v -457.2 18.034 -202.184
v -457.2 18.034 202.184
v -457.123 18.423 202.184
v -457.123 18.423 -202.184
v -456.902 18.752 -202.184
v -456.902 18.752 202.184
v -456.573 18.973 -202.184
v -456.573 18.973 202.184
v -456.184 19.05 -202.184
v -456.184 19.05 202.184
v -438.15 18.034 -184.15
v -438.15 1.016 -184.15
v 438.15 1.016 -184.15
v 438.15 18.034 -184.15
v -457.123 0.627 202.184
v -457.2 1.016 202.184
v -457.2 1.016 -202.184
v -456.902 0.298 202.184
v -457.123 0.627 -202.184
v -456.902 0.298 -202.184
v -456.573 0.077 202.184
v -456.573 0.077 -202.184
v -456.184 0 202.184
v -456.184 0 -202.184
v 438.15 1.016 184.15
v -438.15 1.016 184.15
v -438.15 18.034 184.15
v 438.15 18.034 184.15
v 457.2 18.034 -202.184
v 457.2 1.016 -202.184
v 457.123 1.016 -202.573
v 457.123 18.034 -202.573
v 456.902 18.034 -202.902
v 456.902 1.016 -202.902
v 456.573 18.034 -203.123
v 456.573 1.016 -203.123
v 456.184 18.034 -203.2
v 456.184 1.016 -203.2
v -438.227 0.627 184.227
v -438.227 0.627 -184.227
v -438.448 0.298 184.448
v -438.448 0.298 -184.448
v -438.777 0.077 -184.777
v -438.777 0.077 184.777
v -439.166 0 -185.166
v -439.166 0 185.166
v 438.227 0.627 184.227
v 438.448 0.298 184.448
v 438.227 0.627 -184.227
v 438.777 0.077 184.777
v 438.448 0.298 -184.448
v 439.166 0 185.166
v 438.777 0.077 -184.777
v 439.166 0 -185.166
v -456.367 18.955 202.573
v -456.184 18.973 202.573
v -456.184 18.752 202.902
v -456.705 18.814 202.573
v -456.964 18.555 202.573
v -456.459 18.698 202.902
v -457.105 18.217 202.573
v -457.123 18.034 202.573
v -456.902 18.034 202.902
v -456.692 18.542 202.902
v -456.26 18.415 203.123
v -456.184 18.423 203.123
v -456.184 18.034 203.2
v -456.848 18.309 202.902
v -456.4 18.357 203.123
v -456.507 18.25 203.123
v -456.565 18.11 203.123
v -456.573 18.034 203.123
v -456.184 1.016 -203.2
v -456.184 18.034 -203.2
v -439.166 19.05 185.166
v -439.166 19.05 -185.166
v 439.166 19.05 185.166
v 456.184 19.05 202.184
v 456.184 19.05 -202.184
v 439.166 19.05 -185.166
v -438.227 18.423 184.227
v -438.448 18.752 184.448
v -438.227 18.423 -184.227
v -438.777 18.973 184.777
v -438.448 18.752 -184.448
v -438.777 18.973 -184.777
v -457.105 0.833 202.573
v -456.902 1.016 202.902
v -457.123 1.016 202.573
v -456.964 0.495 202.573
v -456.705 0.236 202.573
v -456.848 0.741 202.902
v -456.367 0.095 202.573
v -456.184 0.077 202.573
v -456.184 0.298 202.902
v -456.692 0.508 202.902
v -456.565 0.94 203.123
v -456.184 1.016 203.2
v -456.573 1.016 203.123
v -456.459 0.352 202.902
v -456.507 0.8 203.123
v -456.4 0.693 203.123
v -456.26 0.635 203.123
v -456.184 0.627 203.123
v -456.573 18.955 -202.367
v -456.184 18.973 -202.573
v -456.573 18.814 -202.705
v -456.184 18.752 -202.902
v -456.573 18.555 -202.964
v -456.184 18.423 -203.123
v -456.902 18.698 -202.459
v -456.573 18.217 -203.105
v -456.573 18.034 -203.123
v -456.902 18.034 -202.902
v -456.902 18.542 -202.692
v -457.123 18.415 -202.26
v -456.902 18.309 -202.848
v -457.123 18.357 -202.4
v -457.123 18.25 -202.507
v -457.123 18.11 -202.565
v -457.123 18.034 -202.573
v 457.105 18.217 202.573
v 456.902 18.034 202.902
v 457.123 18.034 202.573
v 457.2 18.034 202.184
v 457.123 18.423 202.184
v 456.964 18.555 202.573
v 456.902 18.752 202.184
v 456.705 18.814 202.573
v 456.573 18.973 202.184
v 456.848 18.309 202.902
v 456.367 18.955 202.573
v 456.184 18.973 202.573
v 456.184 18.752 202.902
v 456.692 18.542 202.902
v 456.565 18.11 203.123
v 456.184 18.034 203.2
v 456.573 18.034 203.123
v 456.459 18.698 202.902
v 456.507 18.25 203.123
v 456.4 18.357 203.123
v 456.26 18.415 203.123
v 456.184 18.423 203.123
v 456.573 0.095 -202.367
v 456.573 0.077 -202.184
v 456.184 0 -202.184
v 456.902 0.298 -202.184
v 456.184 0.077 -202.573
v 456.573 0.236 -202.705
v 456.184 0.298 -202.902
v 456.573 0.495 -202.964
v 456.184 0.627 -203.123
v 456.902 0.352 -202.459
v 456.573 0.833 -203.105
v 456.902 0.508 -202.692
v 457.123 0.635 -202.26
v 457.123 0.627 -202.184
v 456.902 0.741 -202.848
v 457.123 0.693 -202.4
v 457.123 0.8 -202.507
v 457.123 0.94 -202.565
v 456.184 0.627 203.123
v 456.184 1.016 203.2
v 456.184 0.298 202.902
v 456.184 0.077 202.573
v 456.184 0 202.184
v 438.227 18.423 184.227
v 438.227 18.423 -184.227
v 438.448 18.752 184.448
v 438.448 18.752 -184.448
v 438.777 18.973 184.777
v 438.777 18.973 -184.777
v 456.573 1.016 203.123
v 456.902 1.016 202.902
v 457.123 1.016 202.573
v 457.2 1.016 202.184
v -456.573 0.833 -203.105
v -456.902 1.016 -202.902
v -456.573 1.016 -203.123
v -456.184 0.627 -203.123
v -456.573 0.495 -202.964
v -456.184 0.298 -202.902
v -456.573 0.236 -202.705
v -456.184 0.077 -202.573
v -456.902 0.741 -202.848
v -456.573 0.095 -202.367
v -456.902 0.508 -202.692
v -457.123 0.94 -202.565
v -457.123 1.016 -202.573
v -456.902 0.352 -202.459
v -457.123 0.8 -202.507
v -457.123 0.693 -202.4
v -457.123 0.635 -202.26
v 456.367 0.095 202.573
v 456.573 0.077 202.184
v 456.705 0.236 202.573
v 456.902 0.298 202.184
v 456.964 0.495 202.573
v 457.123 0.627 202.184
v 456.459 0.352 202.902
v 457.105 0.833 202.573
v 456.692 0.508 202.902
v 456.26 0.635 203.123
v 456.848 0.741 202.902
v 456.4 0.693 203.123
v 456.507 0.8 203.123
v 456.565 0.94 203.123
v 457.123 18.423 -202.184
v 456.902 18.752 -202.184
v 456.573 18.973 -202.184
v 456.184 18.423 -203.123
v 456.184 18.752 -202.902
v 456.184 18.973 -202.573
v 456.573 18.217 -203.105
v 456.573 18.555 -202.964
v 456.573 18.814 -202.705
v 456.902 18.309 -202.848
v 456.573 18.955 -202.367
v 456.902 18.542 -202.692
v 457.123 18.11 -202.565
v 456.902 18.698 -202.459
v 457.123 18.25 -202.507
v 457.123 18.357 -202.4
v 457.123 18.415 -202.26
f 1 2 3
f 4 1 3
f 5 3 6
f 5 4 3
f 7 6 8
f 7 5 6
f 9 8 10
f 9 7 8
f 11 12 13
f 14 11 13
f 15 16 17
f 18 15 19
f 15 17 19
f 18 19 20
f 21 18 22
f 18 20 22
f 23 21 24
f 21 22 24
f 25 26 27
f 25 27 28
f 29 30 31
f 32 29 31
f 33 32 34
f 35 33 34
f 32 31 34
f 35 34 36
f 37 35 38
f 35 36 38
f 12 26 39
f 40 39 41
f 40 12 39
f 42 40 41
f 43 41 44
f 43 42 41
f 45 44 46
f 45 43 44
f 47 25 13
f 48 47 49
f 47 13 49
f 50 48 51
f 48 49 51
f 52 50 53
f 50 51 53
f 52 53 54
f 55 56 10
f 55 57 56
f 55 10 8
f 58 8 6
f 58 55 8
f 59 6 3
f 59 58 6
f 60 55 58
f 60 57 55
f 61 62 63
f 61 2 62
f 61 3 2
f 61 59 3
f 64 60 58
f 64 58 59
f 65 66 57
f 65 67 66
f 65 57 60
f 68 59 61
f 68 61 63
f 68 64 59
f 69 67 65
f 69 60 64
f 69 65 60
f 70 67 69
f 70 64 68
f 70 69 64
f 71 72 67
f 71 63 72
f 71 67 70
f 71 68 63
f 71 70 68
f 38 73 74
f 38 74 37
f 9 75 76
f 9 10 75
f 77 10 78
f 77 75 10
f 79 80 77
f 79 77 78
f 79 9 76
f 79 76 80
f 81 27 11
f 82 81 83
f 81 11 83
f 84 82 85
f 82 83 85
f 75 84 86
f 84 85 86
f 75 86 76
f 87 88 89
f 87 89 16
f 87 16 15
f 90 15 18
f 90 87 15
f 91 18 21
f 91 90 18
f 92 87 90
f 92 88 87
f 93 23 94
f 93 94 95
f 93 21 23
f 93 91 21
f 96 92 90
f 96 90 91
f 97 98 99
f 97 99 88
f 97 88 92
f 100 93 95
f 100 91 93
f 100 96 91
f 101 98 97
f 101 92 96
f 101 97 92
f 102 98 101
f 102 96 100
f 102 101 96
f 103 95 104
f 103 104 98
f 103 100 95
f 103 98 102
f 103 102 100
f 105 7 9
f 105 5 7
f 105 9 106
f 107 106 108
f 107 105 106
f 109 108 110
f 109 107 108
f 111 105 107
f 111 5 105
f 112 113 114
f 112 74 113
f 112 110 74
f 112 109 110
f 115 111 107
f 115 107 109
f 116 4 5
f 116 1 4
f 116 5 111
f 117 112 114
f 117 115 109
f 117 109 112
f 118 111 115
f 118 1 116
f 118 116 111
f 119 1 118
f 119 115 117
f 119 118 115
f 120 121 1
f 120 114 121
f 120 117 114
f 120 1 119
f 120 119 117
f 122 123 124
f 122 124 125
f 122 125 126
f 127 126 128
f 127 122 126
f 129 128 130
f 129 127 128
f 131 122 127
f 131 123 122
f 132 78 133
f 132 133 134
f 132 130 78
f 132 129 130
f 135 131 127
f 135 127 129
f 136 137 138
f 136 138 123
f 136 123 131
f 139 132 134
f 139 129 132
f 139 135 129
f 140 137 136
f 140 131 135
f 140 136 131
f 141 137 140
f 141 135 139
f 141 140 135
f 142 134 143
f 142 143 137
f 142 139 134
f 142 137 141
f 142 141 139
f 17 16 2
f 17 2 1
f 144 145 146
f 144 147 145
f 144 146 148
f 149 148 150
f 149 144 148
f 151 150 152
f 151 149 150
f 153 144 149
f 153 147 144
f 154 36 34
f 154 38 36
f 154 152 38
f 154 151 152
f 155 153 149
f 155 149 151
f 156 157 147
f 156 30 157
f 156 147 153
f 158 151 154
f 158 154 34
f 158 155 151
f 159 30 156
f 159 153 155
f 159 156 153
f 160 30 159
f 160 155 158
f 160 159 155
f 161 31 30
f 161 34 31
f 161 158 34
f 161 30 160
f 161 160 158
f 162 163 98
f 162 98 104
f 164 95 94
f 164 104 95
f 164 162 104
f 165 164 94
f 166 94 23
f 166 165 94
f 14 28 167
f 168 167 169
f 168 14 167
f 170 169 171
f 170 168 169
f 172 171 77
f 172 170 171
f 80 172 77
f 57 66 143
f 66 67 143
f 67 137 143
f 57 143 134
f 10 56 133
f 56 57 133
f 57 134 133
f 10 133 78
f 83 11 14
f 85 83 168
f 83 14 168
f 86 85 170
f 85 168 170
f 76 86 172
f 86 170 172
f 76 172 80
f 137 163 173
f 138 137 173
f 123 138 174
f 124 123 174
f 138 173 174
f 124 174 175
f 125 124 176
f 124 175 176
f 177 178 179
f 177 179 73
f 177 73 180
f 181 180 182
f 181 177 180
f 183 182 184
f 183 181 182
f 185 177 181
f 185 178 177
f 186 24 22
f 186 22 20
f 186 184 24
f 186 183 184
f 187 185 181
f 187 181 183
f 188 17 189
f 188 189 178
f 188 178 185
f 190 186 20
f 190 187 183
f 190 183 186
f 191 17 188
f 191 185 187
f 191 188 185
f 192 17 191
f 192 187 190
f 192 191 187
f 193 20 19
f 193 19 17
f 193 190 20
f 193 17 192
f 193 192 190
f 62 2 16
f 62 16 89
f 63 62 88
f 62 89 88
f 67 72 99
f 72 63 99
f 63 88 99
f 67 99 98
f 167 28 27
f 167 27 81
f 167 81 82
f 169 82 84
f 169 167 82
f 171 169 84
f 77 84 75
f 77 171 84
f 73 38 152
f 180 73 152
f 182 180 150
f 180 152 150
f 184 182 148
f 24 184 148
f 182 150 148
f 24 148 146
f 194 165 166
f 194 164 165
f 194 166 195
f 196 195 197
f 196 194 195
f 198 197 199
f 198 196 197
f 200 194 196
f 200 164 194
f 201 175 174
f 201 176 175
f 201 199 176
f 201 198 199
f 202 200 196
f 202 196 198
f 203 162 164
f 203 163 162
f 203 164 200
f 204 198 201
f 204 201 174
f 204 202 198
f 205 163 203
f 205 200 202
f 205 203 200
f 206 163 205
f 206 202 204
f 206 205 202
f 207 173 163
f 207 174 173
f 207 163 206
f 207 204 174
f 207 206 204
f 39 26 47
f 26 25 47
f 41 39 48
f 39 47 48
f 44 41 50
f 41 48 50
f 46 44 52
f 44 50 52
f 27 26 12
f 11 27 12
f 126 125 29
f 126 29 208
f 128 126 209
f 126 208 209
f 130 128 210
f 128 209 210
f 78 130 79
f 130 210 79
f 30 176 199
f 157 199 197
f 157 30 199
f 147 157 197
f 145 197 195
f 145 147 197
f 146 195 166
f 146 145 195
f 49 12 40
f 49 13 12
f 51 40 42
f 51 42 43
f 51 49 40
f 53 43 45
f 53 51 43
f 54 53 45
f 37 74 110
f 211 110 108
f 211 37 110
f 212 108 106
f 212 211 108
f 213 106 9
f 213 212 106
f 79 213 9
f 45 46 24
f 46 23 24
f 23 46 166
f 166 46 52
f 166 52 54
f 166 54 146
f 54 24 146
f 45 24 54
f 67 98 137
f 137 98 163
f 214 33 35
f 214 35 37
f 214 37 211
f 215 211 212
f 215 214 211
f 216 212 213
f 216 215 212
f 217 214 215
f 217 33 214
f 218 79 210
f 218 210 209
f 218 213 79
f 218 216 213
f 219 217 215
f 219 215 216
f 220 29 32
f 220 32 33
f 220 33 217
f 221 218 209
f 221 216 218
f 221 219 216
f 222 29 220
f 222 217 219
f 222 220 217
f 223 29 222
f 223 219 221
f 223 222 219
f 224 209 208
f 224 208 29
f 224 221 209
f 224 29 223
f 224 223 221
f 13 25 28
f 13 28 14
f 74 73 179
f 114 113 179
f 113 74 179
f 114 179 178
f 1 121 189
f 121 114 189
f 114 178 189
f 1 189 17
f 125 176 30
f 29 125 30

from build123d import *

# Parameters (mm, degrees)
SKETCH1_W           = 914.4
SKETCH1_H           = 406.4
SKETCH1_W_2         = 876.3
SKETCH1_H_2         = 368.3
BOSS_EXTRUDE1_DEPTH = 19.05
FILLET1_R           = 1.016
FILLET2_R           = 1.016


with BuildPart() as part:
    # Sketch1 → Boss-Extrude1 (new body)
    with BuildSketch(Plane(origin=(0, 0, 0), x_dir=(1, 0, 0), z_dir=(0, 1, 0))):
        Rectangle(SKETCH1_W, SKETCH1_H)
        Rectangle(SKETCH1_W_2, SKETCH1_H_2, mode=Mode.SUBTRACT)
    extrude(amount=BOSS_EXTRUDE1_DEPTH)

    # Fillet1
    fillet1_edges = [part.edges().sort_by_distance(p)[0] for p in [
        (-457.2, 19.05, 0),
        (438.15, 0, 0),
        (0, 0, -184.15),
        (-438.15, 0, 0),
        (0, 0, 184.15),
        (438.15, 19.05, 0),
        (0, 19.05, 203.2),
        (0, 19.05, -184.15),
        (-438.15, 19.05, 0),
        (0, 19.05, 184.15),
        (457.2, 19.05, 0),
        (0, 0, 203.2),
        (-457.2, 0, 0),
        (0, 0, -203.2),
        (457.2, 0, 0),
        (0, 19.05, -203.2),
    ]]
    fillet(fillet1_edges, radius=FILLET1_R)

    # Fillet2
    # the kernel refuses this fillet: 1.016 mm, written as the material it takes off along each edge
    with BuildSketch(Plane(origin=(456.184, 1.016, 202.184), x_dir=(1, 0, 0), z_dir=(0, 0, 1))) as fillet2_piece_1_section:
        Polygon((0, 0), (FILLET2_R * 1.02, 0), (FILLET2_R * 1.02, -FILLET2_R * 1.02), (0, -FILLET2_R * 1.02), align=None)
    fillet2_piece_1 = extrude(amount=FILLET2_R * 1.02, mode=Mode.PRIVATE)
    fillet2_piece_1 = fillet2_piece_1 - Plane(origin=(456.184, 1.016, 202.184), x_dir=(-0.7071067811865475, 0.7071067811865475, 0), z_dir=(0, 0, 1)) * Sphere(FILLET2_R, mode=Mode.PRIVATE)
    add(fillet2_piece_1, mode=Mode.SUBTRACT)
    with BuildSketch(Plane(origin=(-456.184, 1.016, 202.184), x_dir=(-1, 0, 0), z_dir=(0, 0, 1))) as fillet2_piece_2_section:
        Polygon((0, 0), (FILLET2_R * 1.02, 0), (FILLET2_R * 1.02, FILLET2_R * 1.02), (0, FILLET2_R * 1.02), align=None)
    fillet2_piece_2 = extrude(amount=FILLET2_R * 1.02, mode=Mode.PRIVATE)
    fillet2_piece_2 = fillet2_piece_2 - Plane(origin=(-456.184, 1.016, 202.184), x_dir=(0.7071067811865475, 0.7071067811865475, 0), z_dir=(0, 0, 1)) * Sphere(FILLET2_R, mode=Mode.PRIVATE)
    add(fillet2_piece_2, mode=Mode.SUBTRACT)
    with BuildSketch(Plane(origin=(456.184, 1.016, -202.184), x_dir=(0, 0, -1), z_dir=(1, 0, 0))) as fillet2_piece_3_section:
        Polygon((0, 0), (FILLET2_R * 1.02, 0), (FILLET2_R * 1.02, -FILLET2_R * 1.02), (0, -FILLET2_R * 1.02), align=None)
    fillet2_piece_3 = extrude(amount=FILLET2_R * 1.02, mode=Mode.PRIVATE)
    fillet2_piece_3 = fillet2_piece_3 - Plane(origin=(456.184, 1.016, -202.184), x_dir=(0, 0.7071067811865475, 0.7071067811865475), z_dir=(1, 0, 0)) * Sphere(FILLET2_R, mode=Mode.PRIVATE)
    add(fillet2_piece_3, mode=Mode.SUBTRACT)
    with BuildSketch(Plane(origin=(-456.184, 1.016, -202.184), x_dir=(0, 0, -1), z_dir=(-1, 0, 0))) as fillet2_piece_4_section:
        Polygon((0, 0), (FILLET2_R * 1.02, 0), (FILLET2_R * 1.02, FILLET2_R * 1.02), (0, FILLET2_R * 1.02), align=None)
    fillet2_piece_4 = extrude(amount=FILLET2_R * 1.02, mode=Mode.PRIVATE)
    fillet2_piece_4 = fillet2_piece_4 - Plane(origin=(-456.184, 1.016, -202.184), x_dir=(0, 0.7071067811865475, 0.7071067811865475), z_dir=(-1, 0, 0)) * Sphere(FILLET2_R, mode=Mode.PRIVATE)
    add(fillet2_piece_4, mode=Mode.SUBTRACT)
    with BuildSketch(Plane(origin=(-456.184, 18.034, -202.184), x_dir=(0, 0, -1), z_dir=(-1, 0, 0))) as fillet2_piece_5_section:
        Polygon((0, 0), (FILLET2_R * 1.02, 0), (FILLET2_R * 1.02, -FILLET2_R * 1.02), (0, -FILLET2_R * 1.02), align=None)
    fillet2_piece_5 = extrude(amount=FILLET2_R * 1.02, mode=Mode.PRIVATE)
    fillet2_piece_5 = fillet2_piece_5 - Plane(origin=(-456.184, 18.034, -202.184), x_dir=(0, -0.7071067811865475, 0.7071067811865475), z_dir=(-1, 0, 0)) * Sphere(FILLET2_R, mode=Mode.PRIVATE)
    add(fillet2_piece_5, mode=Mode.SUBTRACT)
    with BuildSketch(Plane(origin=(456.184, 18.034, -202.184), x_dir=(0, 0, -1), z_dir=(1, 0, 0))) as fillet2_piece_6_section:
        Polygon((0, 0), (FILLET2_R * 1.02, 0), (FILLET2_R * 1.02, FILLET2_R * 1.02), (0, FILLET2_R * 1.02), align=None)
    fillet2_piece_6 = extrude(amount=FILLET2_R * 1.02, mode=Mode.PRIVATE)
    fillet2_piece_6 = fillet2_piece_6 - Plane(origin=(456.184, 18.034, -202.184), x_dir=(0, -0.7071067811865475, 0.7071067811865475), z_dir=(1, 0, 0)) * Sphere(FILLET2_R, mode=Mode.PRIVATE)
    add(fillet2_piece_6, mode=Mode.SUBTRACT)
    with BuildSketch(Plane(origin=(-456.184, 18.034, 202.184), x_dir=(-1, 0, 0), z_dir=(0, 0, 1))) as fillet2_piece_7_section:
        Polygon((0, 0), (FILLET2_R * 1.02, 0), (FILLET2_R * 1.02, -FILLET2_R * 1.02), (0, -FILLET2_R * 1.02), align=None)
    fillet2_piece_7 = extrude(amount=FILLET2_R * 1.02, mode=Mode.PRIVATE)
    fillet2_piece_7 = fillet2_piece_7 - Plane(origin=(-456.184, 18.034, 202.184), x_dir=(0.7071067811865475, -0.7071067811865475, 0), z_dir=(0, 0, 1)) * Sphere(FILLET2_R, mode=Mode.PRIVATE)
    add(fillet2_piece_7, mode=Mode.SUBTRACT)
    with BuildSketch(Plane(origin=(456.184, 18.034, 202.184), x_dir=(1, 0, 0), z_dir=(0, 0, 1))) as fillet2_piece_8_section:
        Polygon((0, 0), (FILLET2_R * 1.02, 0), (FILLET2_R * 1.02, FILLET2_R * 1.02), (0, FILLET2_R * 1.02), align=None)
    fillet2_piece_8 = extrude(amount=FILLET2_R * 1.02, mode=Mode.PRIVATE)
    fillet2_piece_8 = fillet2_piece_8 - Plane(origin=(456.184, 18.034, 202.184), x_dir=(-0.7071067811865475, -0.7071067811865475, 0), z_dir=(0, 0, 1)) * Sphere(FILLET2_R, mode=Mode.PRIVATE)
    add(fillet2_piece_8, mode=Mode.SUBTRACT)
    with BuildSketch(Plane(origin=(-457.2, 1.016, -203.2), x_dir=(0, 0, 1), z_dir=(0, 1, 0)), Plane(origin=(-457.2, 1.016, 203.2), x_dir=(1, 0, 0), z_dir=(0, 1, 0))) as fillet2_piece_9:
        with BuildLine():
            CenterArc((FILLET2_R, FILLET2_R), FILLET2_R, 180, 90)
            Line((0, FILLET2_R), (0, 0))
            Line((0, 0), (FILLET2_R, 0))
        make_face()
    extrude(amount=17.018, mode=Mode.SUBTRACT)
    with BuildSketch(Plane(origin=(457.2, 1.016, -203.2), x_dir=(0, 0, 1), z_dir=(0, 1, 0)), Plane(origin=(457.2, 1.016, 203.2), x_dir=(-1, 0, 0), z_dir=(0, 1, 0))) as fillet2_piece_10:
        with BuildLine():
            CenterArc((FILLET2_R, -FILLET2_R), FILLET2_R, 90, 90)
            Line((0, -FILLET2_R), (0, 0))
            Line((0, 0), (FILLET2_R, 0))
        make_face()
    extrude(amount=17.018, mode=Mode.SUBTRACT)


solid = part.part
